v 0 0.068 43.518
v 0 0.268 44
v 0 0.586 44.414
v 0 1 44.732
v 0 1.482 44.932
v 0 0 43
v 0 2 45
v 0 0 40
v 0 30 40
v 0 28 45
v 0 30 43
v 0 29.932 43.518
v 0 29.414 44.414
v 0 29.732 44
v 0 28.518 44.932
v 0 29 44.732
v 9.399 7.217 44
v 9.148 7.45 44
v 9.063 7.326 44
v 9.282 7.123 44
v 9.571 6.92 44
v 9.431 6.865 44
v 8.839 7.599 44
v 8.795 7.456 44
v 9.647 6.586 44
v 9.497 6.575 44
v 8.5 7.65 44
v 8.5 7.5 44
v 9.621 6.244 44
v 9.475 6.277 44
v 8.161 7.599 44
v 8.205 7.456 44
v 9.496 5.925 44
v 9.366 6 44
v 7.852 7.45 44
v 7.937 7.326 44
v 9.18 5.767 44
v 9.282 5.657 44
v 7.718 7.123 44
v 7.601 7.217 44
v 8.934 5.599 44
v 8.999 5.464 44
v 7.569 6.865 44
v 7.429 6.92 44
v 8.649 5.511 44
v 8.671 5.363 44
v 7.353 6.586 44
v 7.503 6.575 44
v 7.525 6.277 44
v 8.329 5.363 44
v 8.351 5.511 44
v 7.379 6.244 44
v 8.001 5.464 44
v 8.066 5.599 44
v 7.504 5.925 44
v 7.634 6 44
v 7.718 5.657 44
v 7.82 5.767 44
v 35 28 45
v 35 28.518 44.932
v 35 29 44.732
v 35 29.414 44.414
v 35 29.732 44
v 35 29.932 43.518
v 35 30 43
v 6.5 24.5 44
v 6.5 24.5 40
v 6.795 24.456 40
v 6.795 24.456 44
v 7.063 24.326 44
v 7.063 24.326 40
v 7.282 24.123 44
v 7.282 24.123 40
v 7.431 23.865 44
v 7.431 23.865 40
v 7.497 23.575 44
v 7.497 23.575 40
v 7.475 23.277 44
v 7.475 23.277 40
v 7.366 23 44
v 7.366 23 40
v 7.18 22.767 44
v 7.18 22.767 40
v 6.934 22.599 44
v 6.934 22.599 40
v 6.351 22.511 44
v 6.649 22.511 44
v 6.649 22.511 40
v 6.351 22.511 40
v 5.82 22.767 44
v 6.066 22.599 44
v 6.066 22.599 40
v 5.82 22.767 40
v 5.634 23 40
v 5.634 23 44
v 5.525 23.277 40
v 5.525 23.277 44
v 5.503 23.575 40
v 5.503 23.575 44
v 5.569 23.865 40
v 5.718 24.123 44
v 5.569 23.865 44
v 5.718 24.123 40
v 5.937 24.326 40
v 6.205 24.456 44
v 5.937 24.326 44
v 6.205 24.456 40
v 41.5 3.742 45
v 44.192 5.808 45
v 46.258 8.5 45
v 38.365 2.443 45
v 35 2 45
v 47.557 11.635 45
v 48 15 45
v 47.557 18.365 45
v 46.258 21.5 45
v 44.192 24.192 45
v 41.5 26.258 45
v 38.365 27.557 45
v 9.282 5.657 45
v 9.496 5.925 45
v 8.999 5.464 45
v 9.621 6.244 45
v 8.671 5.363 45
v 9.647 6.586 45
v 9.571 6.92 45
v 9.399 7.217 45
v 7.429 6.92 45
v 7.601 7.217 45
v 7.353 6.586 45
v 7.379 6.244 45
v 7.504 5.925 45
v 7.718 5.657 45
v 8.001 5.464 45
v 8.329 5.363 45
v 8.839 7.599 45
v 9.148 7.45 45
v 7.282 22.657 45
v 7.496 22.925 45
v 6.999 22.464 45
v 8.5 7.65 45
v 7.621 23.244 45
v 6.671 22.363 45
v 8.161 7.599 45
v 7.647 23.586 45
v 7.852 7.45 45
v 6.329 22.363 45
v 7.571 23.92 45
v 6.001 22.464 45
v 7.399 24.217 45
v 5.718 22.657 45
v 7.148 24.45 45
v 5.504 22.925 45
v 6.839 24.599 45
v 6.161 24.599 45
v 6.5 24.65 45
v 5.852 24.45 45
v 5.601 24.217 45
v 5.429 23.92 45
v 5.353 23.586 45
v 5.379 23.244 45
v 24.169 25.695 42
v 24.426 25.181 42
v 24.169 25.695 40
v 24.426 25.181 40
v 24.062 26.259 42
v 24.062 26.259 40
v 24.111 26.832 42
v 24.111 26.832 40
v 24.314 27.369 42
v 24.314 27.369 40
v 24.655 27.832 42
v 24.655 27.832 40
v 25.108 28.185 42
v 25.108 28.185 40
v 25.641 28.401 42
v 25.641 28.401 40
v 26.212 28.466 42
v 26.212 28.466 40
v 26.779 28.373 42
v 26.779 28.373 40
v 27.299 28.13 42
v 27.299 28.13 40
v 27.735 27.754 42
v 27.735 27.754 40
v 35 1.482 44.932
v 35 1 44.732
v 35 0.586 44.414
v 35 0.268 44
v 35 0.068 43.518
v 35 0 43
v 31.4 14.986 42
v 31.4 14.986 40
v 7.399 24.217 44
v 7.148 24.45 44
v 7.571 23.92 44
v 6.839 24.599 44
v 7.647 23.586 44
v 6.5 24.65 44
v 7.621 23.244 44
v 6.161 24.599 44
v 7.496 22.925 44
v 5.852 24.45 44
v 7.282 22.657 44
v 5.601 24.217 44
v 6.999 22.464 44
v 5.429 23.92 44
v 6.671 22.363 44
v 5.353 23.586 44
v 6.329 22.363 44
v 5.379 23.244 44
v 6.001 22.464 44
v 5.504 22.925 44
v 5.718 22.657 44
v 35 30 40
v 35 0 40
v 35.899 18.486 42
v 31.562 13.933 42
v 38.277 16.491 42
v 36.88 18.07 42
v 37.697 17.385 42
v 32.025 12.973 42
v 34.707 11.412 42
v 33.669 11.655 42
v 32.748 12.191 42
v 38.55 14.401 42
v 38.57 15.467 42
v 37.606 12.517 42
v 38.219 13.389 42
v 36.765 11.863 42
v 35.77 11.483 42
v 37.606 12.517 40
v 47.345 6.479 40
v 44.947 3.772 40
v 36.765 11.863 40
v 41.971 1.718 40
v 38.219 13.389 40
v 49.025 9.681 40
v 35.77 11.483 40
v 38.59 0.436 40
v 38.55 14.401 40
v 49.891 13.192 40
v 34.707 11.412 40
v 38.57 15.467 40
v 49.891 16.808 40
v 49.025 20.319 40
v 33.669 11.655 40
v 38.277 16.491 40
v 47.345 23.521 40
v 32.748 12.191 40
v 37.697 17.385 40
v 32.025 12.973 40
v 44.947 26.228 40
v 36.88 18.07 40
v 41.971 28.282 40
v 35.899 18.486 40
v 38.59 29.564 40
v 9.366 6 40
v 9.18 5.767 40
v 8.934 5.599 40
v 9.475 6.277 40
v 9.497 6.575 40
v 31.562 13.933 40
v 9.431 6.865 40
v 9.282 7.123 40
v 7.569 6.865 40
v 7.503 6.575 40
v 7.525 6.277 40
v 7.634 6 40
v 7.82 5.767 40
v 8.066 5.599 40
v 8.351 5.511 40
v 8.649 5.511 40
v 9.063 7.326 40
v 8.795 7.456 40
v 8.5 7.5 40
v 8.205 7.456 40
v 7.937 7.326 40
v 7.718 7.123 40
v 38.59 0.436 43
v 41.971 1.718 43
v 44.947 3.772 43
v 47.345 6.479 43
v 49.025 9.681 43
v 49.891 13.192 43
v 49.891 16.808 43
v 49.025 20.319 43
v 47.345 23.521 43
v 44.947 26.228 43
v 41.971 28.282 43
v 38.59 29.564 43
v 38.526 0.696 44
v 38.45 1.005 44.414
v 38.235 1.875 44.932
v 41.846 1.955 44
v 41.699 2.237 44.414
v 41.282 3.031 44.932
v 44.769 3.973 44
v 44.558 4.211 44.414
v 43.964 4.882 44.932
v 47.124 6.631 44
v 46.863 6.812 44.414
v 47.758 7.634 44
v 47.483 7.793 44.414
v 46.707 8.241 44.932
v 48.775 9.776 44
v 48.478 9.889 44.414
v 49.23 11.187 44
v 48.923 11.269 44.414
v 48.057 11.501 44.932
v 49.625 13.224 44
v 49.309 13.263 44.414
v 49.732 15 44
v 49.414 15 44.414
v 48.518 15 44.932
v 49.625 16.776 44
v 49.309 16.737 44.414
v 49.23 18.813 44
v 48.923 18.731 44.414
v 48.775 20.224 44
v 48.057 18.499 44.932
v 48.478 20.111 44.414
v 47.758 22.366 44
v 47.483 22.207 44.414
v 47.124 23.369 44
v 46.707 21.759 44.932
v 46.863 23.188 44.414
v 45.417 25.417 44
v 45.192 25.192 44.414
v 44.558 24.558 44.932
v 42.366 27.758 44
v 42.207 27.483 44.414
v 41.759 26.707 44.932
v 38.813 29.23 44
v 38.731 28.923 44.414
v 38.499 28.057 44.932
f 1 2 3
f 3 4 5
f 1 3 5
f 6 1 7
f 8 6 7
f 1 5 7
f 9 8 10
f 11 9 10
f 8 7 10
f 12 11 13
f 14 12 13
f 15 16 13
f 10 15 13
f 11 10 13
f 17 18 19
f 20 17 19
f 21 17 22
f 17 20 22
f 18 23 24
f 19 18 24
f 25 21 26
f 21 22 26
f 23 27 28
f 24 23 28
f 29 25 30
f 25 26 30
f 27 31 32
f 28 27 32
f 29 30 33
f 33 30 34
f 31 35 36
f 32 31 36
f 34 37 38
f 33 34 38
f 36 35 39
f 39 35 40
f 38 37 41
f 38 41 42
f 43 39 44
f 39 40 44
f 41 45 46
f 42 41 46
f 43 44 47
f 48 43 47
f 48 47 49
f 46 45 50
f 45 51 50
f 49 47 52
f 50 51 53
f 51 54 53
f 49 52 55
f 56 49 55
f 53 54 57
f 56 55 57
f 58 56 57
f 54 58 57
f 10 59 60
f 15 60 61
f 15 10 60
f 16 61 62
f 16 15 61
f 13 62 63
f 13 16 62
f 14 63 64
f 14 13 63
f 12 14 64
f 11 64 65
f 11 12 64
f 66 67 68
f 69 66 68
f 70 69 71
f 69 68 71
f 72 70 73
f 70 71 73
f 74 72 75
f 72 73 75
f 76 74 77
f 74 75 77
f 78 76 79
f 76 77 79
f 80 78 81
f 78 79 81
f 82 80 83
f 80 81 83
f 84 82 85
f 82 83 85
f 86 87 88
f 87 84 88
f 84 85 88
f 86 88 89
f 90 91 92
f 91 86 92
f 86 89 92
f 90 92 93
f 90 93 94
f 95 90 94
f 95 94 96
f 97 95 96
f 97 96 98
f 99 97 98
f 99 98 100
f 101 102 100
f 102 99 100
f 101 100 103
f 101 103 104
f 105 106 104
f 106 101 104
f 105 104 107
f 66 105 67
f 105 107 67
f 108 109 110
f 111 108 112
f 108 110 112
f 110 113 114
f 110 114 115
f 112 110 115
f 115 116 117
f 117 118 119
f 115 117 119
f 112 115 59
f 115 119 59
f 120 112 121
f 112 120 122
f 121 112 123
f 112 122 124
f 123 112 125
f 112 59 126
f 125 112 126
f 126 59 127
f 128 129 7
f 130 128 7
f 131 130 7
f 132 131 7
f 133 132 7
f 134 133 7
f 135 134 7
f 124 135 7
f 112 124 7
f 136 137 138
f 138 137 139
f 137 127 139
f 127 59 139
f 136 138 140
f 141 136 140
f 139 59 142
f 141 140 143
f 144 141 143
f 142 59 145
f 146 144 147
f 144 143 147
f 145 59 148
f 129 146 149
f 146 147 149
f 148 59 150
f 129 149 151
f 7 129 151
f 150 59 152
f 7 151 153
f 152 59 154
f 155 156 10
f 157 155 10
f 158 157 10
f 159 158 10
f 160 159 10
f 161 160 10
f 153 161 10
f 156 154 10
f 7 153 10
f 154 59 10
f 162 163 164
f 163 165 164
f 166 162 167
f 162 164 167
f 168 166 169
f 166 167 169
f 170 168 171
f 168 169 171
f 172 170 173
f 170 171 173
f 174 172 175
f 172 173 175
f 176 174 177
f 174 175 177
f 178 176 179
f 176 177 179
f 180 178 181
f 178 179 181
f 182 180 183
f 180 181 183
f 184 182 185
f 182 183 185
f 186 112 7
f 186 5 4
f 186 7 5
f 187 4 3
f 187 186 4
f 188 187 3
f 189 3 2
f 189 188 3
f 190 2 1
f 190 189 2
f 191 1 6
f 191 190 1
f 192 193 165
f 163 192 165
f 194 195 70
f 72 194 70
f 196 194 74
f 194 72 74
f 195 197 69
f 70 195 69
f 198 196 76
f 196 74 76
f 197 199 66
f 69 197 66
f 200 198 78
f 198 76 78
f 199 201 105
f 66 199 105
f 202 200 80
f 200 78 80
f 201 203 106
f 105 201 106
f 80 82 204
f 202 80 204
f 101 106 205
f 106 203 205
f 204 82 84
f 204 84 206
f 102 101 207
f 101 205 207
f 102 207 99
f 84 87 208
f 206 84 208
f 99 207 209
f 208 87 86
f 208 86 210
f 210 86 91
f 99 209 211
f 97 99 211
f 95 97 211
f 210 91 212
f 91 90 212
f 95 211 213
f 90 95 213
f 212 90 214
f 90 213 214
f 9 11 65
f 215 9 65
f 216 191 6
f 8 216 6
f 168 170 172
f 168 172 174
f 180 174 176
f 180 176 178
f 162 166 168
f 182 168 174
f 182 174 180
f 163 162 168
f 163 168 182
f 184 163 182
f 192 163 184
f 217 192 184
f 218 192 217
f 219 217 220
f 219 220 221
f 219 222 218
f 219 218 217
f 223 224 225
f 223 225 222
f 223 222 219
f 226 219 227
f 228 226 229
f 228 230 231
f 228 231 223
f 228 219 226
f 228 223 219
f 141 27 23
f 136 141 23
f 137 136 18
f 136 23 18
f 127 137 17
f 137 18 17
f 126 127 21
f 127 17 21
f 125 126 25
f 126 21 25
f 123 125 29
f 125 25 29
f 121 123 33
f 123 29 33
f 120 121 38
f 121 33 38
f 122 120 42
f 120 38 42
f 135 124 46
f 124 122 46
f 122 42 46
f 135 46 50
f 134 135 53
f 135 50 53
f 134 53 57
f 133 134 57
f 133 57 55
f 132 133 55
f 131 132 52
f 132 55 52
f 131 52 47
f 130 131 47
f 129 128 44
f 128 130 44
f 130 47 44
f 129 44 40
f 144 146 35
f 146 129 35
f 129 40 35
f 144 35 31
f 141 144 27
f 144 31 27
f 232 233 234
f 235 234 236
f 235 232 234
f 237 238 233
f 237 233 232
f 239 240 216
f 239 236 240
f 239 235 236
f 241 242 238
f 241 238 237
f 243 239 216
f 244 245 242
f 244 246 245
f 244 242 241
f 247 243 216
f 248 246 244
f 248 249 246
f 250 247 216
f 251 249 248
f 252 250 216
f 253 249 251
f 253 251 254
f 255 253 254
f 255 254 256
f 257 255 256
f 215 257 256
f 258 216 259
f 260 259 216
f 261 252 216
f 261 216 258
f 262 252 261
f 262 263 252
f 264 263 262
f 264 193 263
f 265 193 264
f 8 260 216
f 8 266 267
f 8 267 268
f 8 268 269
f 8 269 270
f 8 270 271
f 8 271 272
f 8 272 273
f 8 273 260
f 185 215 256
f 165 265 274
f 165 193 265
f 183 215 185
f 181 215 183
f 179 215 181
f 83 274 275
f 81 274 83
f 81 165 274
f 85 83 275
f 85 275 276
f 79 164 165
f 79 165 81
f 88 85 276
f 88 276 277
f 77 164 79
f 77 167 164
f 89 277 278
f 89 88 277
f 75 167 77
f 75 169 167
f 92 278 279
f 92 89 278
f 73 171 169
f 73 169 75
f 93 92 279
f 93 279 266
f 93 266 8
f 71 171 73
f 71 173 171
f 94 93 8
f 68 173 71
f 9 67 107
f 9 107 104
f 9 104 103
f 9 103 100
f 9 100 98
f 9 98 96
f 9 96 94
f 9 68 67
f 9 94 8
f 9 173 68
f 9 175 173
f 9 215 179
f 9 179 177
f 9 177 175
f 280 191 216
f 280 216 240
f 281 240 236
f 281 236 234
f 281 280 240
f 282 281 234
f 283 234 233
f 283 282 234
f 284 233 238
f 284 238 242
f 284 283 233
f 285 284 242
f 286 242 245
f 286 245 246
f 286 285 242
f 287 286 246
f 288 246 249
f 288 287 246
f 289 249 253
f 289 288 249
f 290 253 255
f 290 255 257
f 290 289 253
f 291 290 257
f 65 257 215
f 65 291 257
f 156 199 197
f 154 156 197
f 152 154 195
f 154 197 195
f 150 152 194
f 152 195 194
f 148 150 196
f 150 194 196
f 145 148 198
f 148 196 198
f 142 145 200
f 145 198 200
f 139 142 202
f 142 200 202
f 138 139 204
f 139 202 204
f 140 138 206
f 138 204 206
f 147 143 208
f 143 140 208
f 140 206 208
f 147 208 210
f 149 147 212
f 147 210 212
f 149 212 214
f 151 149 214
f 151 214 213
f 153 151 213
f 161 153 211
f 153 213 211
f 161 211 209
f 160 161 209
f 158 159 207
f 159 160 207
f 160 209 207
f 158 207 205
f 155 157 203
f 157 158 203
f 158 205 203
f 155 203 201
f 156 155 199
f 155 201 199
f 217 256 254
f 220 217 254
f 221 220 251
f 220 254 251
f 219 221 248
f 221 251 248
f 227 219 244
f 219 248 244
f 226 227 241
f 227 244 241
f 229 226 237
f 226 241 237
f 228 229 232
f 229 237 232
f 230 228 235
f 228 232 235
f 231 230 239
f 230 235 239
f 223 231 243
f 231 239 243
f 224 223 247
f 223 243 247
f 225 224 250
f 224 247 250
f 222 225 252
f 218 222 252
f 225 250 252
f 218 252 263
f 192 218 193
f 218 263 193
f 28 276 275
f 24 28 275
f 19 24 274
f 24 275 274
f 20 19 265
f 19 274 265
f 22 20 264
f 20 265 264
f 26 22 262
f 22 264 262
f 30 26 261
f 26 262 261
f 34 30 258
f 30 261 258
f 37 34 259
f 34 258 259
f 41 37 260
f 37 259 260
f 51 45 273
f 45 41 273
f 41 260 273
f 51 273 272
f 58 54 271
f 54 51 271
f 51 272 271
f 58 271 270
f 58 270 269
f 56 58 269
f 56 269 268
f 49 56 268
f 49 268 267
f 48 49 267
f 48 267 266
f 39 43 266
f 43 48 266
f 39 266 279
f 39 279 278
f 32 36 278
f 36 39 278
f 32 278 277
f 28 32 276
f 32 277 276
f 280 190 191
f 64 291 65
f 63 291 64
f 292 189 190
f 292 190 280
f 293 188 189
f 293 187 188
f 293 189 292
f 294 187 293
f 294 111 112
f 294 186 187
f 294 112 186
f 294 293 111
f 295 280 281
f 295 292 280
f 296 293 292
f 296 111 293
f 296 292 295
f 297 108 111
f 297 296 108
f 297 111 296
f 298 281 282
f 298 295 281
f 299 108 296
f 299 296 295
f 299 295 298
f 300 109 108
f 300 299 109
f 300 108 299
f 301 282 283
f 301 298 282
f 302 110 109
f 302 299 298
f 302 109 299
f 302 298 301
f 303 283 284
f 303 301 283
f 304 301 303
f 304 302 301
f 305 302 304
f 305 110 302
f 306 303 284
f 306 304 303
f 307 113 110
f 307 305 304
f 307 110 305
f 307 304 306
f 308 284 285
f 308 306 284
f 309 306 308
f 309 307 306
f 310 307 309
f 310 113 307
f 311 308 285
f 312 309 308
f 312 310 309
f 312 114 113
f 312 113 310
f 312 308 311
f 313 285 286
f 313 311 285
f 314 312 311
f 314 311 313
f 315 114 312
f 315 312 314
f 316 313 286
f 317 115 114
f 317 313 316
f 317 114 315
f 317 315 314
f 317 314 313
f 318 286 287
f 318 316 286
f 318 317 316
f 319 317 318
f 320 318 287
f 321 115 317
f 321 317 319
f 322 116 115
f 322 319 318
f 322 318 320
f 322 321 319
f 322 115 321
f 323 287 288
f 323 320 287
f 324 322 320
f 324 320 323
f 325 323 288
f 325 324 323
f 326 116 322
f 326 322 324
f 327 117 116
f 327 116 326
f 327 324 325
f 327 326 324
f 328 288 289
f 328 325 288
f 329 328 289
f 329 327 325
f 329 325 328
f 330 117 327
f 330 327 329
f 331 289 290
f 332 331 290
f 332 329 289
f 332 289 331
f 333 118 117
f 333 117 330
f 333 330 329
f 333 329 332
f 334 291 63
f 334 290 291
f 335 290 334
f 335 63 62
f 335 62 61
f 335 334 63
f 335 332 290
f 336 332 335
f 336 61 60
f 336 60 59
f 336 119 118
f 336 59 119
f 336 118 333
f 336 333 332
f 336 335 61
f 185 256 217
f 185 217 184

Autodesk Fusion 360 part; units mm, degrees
sketch "Sketch1" plane through (0, 0, 0) normal (0, 0, 1) x (1, 0, 0)
  line L0 (0, 0) -> (35, 0)
  line L1 (35, 30) -> (0, 30)
  line L2 (0, 30) -> (0, 0)
  circle A0 centre (35, 15) radius 2.25
  arc A1 (35, 0) -> (35, 30) centre (35, 15) ccw
  line L3 (15, 0) -> (15, 30)
  line L4 (15, 15) -> (0, 30) construction
  line L5 (7.5, 22.5) -> (7.5, 30) construction
  line L6 (7.5, 22.5) -> (0, 22.5) construction
  circle A2 centre (6.5, 23.5) radius 1
  circle A3 centre (8.5, 23.5) radius 1 construction
  circle A4 centre (8.5, 6.5) radius 1
  line L7 (15, 0) -> (0, 15) construction
  line L8 (7.5, 7.5) -> (7.5, 0) construction
  line L9 (7.5, 7.5) -> (15, 7.5) construction
  point P0 (40, 0)
  point P1 (15, 15)
  dimension "d1" = 30
  dimension "d7" = 35
  dimension "d8" = 35
  dimension "d9" = 4.5
  dimension "d14" = 2
  dimension "d36" = 2
extrude "Extrude1" add sketch "Sketch1" along normal blind 5 contours L0 L1 L2 L3 | L0 L1 A1 L3 | A0 | A2 | A4 makes body 1
hole "Hole1" at (8.5, 6.5, 0) at (6.5, 23.5, 0) direction (0, 0, 1) diameter 2 end through all counterbore diameter 2.3 counterbore depth 1 bodies 1 1
sketch "Sketch2" plane through (0, 0, 5) normal (0, 0, 1) x (-1, 0, 0)
  circle A0 centre (-8.5, -6.5) radius 1
  circle A1 centre (-6.5, -23.5) radius 1
  arc A2 (-35, 0) -> (-35, -30) centre (-35, -15) ccw
  line L0 (-35, -30) -> (0, -30)
  line L1 (0, -30) -> (0, 0)
  line L2 (0, 0) -> (-35, 0)
  circle A3 centre (-35, -15) radius 2.25
fillet "Fillet1" radius 2 3 edges at (17.5, 0, 0) (50, 15, 0) (17.5, 30, 0) on bodies 1
ref_plane "WorkPlane1" through (25, 15, 22.5) normal (0, 0, 1) x (1, 0, 0)
mirror "Mirror1" about plane through (25, 15, 22.5) normal (0, 0, 1) of bodies 1 makes body 2
extrude "Extrude2" cut sketch "Sketch2" against normal blind 4 contours A3 bodies 1
sketch "Sketch3" plane through (0, 0, 40) normal (0, 0, -1) x (1, 0, 0)
  circle A0 centre (8.5, -6.5) radius 1
  circle A1 centre (6.5, -23.5) radius 1
  arc A2 (35, -30) -> (35, 0) centre (35, -15) ccw
  line L0 (35, 0) -> (0, 0)
  line L1 (0, 0) -> (0, -30)
  line L2 (0, -30) -> (35, -30)
  line L3 (31.4, -14.9863) -> (24.4256, -25.1806)
  line L4 (35, -15) -> (24.8695, -28.0239) construction
  arc A3 (24.4256, -25.1806) -> (27.7346, -27.7544) centre (26.1588, -26.3663) ccw
  line L5 (35.8992, -18.4859) -> (27.7346, -27.7544)
  line L6 (31.4, -14.9863) -> (35.8992, -18.4859) construction
  arc A4 (35.8992, -18.4859) -> (31.4, -14.9863) centre (35, -15) ccw
  point P0 (35, -15)
  point P1 (35, -15)
  dimension "d30" = 4.2
  dimension "d31" = 5.7
  dimension "d32" = 16.5
  dimension "d33" = 7.2
extrude "Extrude3" cut sketch "Sketch3" against normal blind 2 contours L3 A3 L5 A4 bodies 2
hidden bodies 1
equation "d1 = breadth"
equation "breadth = 30 mm"
equation "length = 50 mm"
equation "d7 = length - d6"
equation "d8 = d7"
equation "d27 = ( 35 / 2 ) * 1 mm"
equation "d36 = d14"
